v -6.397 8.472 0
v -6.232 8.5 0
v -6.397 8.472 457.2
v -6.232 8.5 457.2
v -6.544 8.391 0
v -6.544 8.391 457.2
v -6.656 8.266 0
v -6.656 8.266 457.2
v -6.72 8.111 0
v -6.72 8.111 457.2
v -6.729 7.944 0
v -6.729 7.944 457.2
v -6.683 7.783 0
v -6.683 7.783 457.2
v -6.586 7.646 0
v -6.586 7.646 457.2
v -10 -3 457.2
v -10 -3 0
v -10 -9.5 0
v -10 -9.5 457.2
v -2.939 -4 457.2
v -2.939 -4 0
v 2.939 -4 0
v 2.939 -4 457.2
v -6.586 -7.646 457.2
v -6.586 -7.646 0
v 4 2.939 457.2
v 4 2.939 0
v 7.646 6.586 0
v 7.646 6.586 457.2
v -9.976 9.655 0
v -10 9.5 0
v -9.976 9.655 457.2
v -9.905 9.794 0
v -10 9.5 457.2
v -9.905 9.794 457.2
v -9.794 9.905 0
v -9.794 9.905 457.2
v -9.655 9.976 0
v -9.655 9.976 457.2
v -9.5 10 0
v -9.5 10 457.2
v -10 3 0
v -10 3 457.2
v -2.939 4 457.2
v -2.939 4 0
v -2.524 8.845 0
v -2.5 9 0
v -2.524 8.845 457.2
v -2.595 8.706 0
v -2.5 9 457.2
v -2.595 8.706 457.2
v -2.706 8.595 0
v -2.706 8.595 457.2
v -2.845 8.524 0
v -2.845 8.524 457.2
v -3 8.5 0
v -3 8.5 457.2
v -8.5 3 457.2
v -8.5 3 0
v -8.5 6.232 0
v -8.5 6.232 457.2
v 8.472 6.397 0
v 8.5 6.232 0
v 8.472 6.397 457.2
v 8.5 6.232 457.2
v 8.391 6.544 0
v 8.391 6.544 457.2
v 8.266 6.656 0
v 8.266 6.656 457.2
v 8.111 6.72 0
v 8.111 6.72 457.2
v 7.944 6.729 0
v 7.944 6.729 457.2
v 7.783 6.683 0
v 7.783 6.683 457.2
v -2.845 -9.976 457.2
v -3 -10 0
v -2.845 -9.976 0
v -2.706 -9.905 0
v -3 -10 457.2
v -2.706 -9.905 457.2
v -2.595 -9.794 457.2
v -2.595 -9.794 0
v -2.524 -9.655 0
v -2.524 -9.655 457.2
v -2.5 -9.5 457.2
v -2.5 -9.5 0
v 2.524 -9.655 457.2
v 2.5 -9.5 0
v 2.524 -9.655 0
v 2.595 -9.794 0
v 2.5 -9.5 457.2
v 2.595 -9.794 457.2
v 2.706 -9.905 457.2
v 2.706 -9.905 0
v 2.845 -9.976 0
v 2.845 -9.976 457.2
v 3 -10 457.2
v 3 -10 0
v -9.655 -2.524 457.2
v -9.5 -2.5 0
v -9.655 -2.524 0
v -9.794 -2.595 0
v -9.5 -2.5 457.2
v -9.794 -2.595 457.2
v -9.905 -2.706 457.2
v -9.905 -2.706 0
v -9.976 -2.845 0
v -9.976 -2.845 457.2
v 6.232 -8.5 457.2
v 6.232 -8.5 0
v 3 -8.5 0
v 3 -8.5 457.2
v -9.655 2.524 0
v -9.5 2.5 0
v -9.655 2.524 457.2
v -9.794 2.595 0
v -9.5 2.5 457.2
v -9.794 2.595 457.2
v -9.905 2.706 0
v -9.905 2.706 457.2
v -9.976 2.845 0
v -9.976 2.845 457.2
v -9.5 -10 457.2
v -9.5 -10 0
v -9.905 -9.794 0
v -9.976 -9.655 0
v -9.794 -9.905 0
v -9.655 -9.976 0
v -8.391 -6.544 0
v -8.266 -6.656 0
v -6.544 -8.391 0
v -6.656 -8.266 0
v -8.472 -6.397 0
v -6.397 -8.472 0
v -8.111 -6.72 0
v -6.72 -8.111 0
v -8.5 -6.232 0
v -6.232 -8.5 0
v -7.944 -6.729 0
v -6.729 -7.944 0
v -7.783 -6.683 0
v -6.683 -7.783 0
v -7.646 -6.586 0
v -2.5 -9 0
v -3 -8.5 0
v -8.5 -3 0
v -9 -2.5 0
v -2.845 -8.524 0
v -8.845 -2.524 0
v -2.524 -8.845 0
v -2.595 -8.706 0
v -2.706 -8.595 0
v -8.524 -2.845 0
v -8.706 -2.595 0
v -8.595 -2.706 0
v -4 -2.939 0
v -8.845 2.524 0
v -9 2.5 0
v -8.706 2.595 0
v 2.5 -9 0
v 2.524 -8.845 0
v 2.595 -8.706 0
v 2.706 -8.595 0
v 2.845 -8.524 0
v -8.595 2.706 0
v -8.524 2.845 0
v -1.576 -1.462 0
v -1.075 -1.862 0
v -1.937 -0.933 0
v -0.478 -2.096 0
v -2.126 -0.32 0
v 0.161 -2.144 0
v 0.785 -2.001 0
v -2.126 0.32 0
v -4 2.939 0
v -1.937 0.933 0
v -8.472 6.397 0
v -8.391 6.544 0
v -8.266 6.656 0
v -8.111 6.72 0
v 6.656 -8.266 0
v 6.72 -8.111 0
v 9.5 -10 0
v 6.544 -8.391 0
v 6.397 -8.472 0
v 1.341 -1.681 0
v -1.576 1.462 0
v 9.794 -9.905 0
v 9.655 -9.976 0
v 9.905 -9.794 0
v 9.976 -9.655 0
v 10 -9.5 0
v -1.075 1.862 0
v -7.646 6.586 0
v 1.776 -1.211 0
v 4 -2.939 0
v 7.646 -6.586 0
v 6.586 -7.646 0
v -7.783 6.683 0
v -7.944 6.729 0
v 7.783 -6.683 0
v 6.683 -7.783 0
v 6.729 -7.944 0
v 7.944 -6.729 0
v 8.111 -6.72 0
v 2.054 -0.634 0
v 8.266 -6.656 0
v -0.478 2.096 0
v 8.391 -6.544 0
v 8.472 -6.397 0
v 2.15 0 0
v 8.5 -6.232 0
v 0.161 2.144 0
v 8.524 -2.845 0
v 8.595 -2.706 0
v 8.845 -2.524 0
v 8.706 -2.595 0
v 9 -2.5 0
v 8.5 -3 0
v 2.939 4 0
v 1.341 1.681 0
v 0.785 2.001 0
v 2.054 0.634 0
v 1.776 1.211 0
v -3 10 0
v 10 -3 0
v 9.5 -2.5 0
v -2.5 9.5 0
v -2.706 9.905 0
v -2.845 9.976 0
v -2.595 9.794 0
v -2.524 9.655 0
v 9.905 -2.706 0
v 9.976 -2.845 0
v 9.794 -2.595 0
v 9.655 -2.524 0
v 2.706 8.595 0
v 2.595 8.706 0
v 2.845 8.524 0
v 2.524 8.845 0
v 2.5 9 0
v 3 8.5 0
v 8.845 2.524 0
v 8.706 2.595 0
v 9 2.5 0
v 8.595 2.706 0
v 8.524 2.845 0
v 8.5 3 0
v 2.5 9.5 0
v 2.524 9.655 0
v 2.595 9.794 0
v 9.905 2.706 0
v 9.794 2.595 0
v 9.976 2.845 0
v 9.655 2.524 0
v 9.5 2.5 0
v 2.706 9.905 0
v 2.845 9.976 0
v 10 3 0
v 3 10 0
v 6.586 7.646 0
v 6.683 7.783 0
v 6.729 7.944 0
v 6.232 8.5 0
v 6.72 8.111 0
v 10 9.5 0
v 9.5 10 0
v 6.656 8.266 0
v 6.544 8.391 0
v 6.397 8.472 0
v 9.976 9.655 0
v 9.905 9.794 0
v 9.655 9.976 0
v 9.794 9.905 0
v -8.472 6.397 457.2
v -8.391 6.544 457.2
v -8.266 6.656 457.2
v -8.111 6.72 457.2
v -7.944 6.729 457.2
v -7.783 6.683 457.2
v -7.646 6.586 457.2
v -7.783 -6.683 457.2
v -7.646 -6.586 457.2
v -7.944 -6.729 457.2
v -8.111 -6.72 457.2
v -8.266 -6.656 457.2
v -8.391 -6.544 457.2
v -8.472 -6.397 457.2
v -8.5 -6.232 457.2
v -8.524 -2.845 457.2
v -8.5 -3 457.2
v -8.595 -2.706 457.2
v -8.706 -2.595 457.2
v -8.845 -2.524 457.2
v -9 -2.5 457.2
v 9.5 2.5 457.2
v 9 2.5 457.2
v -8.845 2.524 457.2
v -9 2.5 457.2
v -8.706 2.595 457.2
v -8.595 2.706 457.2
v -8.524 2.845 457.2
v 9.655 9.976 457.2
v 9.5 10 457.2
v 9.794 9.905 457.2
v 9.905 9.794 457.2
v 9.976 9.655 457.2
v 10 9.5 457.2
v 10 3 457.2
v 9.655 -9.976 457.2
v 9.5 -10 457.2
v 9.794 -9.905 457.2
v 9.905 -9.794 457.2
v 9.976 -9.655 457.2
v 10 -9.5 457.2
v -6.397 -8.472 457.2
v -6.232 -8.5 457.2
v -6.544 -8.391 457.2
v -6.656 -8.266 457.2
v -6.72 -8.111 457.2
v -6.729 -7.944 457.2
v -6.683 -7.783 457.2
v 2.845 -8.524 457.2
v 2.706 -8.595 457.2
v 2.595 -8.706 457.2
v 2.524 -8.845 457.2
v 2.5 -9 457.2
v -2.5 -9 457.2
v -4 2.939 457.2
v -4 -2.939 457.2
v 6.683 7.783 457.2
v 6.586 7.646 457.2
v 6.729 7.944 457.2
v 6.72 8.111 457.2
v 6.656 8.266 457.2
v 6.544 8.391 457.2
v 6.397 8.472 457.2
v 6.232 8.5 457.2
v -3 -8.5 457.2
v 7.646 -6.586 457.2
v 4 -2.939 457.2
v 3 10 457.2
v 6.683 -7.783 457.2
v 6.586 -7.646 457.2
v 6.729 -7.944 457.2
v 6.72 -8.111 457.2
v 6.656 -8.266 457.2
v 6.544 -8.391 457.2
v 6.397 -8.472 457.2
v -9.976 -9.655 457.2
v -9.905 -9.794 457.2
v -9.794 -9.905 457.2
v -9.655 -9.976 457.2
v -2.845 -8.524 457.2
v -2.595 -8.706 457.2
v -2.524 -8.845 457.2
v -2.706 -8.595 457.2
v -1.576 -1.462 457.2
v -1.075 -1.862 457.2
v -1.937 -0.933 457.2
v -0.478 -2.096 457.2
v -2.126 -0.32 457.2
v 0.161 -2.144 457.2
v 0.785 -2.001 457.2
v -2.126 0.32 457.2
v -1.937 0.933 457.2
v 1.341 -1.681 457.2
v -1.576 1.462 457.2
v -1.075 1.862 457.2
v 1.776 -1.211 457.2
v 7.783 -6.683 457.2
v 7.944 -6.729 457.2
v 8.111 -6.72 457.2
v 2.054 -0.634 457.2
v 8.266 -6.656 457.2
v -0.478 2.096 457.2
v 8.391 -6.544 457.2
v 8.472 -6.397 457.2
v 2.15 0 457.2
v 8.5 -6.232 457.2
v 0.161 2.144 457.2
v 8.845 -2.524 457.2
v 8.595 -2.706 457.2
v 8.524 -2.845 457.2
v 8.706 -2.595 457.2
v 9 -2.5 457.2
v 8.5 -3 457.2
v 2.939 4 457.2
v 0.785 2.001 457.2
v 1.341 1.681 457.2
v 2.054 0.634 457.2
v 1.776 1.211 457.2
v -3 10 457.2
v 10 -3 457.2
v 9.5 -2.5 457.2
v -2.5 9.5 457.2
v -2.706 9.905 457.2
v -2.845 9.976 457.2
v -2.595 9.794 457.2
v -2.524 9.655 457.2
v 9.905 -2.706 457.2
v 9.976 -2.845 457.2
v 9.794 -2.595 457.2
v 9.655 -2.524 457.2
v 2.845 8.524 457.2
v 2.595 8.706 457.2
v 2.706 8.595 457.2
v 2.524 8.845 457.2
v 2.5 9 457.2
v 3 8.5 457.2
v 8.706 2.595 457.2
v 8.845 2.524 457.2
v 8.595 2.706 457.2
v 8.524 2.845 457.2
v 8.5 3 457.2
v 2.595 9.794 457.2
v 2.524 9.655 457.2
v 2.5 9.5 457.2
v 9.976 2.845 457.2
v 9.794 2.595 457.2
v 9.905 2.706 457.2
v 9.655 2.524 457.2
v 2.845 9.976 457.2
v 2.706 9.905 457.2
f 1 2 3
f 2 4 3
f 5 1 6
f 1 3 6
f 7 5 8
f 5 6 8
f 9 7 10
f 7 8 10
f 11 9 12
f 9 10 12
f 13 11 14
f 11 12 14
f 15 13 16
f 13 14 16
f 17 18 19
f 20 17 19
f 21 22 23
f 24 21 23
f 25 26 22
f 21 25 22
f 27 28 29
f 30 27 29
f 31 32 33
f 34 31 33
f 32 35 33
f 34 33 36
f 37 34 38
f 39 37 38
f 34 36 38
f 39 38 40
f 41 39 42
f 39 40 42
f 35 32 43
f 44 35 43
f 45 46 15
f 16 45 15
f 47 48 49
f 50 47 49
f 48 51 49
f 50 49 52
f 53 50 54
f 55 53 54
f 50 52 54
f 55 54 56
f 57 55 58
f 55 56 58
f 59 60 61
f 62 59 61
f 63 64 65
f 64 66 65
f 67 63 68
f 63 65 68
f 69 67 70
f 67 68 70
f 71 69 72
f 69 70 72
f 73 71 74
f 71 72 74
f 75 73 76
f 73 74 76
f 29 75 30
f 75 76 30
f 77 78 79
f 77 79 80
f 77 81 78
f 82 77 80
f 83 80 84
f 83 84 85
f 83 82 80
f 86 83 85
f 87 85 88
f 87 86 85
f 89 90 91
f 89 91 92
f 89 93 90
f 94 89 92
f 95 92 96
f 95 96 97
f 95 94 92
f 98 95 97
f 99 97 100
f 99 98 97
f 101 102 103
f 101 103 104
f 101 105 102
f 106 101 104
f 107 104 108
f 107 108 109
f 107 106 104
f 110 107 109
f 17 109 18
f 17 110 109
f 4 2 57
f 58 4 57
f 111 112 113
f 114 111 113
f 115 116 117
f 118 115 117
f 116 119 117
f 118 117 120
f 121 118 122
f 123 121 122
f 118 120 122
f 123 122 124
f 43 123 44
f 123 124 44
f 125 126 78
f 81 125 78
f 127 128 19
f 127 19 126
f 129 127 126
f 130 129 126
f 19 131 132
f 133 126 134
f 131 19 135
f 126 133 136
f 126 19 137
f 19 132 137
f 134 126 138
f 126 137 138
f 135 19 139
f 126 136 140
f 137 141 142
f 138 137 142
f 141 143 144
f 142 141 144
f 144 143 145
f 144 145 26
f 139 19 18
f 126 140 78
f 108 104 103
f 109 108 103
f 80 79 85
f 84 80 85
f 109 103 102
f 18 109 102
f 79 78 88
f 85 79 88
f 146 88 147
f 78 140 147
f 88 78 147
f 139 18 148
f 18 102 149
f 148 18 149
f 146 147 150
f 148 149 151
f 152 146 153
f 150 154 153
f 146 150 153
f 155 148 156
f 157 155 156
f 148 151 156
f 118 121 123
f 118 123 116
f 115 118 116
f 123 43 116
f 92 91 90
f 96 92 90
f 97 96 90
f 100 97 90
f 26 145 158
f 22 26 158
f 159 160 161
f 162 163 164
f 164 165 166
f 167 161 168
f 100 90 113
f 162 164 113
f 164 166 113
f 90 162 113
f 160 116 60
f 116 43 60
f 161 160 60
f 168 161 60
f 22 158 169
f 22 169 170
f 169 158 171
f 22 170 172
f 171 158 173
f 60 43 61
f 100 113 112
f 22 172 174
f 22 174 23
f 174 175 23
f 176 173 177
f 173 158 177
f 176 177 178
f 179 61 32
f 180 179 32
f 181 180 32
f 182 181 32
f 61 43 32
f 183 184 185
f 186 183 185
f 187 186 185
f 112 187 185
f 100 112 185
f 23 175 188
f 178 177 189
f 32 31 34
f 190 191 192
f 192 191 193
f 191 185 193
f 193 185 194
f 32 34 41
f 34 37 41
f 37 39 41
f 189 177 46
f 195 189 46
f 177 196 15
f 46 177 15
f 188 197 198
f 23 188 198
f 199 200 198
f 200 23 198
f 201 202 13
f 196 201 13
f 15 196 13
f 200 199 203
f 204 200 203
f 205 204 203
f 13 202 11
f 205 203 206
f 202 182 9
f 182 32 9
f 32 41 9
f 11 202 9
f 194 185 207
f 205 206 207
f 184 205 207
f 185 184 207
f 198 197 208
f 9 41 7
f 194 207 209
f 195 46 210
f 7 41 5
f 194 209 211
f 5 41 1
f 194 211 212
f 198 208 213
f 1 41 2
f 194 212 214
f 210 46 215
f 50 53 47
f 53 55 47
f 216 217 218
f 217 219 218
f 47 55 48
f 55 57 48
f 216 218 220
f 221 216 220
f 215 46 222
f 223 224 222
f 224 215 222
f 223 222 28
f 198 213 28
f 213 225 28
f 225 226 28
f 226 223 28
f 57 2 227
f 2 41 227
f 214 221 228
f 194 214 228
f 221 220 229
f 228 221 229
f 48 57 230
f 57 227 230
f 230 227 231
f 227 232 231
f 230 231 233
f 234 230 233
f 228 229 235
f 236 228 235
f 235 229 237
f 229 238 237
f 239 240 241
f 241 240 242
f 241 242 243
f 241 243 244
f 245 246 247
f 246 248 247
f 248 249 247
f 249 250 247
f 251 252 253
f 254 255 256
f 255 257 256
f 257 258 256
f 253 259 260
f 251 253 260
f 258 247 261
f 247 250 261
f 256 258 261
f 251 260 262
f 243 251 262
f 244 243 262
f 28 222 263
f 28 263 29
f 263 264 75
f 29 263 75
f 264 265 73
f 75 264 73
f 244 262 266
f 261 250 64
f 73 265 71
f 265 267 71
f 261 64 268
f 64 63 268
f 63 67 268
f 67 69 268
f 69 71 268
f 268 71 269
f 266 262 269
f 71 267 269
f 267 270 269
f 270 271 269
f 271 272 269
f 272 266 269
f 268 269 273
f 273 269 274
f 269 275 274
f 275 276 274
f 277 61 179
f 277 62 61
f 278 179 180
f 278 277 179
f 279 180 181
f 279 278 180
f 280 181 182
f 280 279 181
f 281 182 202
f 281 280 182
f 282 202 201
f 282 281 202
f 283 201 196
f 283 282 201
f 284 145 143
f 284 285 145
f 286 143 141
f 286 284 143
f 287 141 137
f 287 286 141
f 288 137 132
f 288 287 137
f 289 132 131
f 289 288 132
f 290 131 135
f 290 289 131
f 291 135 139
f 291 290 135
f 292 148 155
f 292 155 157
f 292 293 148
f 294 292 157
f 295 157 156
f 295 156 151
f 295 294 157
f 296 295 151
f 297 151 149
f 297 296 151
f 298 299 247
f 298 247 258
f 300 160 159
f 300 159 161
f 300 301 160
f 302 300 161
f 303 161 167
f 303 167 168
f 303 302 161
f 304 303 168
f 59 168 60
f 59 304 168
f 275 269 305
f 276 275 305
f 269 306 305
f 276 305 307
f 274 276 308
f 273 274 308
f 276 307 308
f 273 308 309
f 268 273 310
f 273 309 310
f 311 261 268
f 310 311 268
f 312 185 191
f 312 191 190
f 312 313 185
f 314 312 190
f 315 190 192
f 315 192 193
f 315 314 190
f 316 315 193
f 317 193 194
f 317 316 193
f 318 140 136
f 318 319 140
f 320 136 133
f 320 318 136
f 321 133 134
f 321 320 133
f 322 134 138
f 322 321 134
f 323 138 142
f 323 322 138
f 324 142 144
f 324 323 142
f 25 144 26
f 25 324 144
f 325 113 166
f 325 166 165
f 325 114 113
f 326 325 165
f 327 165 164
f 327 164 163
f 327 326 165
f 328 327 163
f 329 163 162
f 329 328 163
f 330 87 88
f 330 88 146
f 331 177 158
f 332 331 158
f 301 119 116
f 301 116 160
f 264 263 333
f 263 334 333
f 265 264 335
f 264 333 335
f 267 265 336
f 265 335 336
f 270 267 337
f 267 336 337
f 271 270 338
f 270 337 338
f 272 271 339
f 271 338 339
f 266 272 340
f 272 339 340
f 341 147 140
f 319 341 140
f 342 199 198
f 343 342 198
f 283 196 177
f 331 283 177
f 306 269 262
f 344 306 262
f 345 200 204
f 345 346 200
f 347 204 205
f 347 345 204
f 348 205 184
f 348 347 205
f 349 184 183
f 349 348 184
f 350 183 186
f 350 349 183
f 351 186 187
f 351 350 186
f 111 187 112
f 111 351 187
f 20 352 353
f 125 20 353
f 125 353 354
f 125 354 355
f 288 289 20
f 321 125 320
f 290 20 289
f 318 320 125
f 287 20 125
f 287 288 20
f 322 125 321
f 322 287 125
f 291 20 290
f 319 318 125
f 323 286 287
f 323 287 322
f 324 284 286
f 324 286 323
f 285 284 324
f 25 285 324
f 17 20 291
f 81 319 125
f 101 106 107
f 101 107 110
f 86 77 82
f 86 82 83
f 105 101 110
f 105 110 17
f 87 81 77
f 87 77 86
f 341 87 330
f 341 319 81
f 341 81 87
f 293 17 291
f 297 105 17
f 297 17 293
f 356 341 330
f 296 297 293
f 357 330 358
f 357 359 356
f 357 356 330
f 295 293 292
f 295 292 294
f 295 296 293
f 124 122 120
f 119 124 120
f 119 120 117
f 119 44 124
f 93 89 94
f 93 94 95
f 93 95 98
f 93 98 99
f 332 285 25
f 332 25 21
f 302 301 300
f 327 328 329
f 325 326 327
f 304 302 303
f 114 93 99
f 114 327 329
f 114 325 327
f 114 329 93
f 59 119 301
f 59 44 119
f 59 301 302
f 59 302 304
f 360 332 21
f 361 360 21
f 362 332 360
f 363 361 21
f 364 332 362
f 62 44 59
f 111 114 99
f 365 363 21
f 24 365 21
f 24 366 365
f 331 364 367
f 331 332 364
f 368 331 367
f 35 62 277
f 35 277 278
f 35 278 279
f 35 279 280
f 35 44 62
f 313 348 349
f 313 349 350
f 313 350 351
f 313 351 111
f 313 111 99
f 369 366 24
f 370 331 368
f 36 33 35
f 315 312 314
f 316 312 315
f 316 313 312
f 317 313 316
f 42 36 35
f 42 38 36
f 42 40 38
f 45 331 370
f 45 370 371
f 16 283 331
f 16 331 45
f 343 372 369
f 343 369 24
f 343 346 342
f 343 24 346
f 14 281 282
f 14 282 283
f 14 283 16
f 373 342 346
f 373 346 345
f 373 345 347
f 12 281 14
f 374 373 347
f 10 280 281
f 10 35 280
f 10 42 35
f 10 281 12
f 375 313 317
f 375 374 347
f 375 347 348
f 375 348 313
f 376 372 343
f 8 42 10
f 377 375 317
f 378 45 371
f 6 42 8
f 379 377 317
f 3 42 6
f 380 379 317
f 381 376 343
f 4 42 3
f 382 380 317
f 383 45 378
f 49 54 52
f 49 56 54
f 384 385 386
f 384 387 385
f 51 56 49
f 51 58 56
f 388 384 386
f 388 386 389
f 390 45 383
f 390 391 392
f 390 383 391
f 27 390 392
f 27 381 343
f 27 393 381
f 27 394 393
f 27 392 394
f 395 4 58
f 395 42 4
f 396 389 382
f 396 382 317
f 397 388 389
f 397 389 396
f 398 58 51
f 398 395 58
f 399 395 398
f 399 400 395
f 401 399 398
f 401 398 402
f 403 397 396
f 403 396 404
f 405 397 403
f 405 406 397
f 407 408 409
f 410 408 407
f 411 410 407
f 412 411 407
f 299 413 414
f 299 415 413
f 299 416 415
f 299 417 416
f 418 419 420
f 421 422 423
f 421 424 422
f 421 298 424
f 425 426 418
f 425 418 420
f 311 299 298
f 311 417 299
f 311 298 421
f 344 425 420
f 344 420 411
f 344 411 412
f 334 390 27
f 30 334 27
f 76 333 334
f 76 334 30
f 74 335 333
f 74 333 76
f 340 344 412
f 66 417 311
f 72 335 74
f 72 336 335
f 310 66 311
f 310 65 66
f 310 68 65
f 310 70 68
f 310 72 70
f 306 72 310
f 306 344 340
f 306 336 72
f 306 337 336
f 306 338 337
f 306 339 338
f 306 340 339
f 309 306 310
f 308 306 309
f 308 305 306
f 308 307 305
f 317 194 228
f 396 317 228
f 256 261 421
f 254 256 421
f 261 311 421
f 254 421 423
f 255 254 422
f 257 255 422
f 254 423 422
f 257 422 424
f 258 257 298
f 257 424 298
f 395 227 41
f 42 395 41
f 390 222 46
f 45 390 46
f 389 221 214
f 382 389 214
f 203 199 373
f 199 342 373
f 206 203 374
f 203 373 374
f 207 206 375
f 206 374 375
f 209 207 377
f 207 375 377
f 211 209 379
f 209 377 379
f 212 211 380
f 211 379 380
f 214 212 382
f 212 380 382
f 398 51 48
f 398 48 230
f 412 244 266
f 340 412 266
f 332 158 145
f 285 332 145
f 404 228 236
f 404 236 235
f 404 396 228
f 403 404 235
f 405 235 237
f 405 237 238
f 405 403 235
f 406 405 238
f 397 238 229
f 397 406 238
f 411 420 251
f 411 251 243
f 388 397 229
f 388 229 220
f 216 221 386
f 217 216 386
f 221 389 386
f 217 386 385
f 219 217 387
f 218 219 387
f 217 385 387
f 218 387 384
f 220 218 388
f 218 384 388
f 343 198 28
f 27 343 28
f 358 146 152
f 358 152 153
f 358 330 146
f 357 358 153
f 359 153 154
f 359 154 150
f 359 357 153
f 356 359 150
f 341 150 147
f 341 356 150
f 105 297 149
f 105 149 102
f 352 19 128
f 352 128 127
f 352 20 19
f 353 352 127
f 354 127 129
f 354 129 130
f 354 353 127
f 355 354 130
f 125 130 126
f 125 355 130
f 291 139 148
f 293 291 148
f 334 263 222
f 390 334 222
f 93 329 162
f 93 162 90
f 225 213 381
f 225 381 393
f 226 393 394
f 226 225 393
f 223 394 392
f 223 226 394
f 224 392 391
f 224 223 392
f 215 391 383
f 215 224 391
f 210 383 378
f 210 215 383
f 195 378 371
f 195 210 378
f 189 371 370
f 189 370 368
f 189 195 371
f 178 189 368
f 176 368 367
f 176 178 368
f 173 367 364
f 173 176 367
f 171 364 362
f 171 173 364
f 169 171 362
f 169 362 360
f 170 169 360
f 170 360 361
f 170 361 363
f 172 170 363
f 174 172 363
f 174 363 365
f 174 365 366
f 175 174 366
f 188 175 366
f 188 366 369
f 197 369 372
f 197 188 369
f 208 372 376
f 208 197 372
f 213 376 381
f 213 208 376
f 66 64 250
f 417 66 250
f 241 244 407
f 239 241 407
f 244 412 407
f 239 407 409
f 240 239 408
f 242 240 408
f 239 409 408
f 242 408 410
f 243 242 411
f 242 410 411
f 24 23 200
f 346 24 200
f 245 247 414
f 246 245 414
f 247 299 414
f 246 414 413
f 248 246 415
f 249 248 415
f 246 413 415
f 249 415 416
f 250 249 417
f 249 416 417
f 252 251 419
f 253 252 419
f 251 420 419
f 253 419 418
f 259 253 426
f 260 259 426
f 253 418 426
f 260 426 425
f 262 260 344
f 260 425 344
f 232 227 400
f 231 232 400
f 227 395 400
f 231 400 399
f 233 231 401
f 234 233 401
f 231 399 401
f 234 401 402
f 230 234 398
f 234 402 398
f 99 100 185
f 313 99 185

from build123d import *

# Parameters (mm, degrees)
SKETCH1_R           = 2.15
BOSS_EXTRUDE1_DEPTH = 457.2
FILLET1_R           = 0.5


with BuildPart() as part:
    # Sketch1 → Boss-Extrude1 (new body)
    with BuildSketch(Plane.XY):
        Polygon((-10, 2.5), (-8.5, 2.5), (-8.5, 7.439339828), (-4, 2.939339828), (-4, 0), (-4, -2.939339828), (-8.5, -7.439339828), (-8.5, -2.5), (-10, -2.5), (-10, -10), (-2.5, -10), (-2.5, -8.5), (-7.439339828, -8.5), (-2.939339828, -4), (0, -4), (2.939339828, -4), (7.439339828, -8.5), (2.5, -8.5), (2.5, -10), (10, -10), (10, -2.5), (8.5, -2.5), (8.5, -7.439339828), (4, -2.939339828), (4, 0), (4, 2.939339828), (8.5, 7.439339828), (8.5, 2.5), (10, 2.5), (10, 10), (2.5, 10), (2.5, 8.5), (7.439339828, 8.5), (2.939339828, 4), (0, 4), (-2.939339828, 4), (-7.439339828, 8.5), (-2.5, 8.5), (-2.5, 10), (-10, 10), align=None)
        Circle(SKETCH1_R, mode=Mode.SUBTRACT)
    extrude(amount=BOSS_EXTRUDE1_DEPTH)

    # Fillet1
    fillet1_edges = [part.edges().sort_by_distance(p)[0] for p in [
        (7.439339828, 8.5, 228.6),
        (2.5, 8.5, 228.6),
        (2.5, 10, 228.6),
        (10, 10, 228.6),
        (10, 2.5, 228.6),
        (8.5, 2.5, 228.6),
        (8.5, 7.439339828, 228.6),
        (8.5, -7.439339828, 228.6),
        (8.5, -2.5, 228.6),
        (10, -2.5, 228.6),
        (10, -10, 228.6),
        (2.5, -10, 228.6),
        (2.5, -8.5, 228.6),
        (7.439339828, -8.5, 228.6),
        (-7.439339828, -8.5, 228.6),
        (-2.5, -8.5, 228.6),
        (-2.5, -10, 228.6),
        (-10, -10, 228.6),
        (-10, -2.5, 228.6),
        (-8.5, -2.5, 228.6),
        (-8.5, -7.439339828, 228.6),
        (-8.5, 7.439339828, 228.6),
        (-8.5, 2.5, 228.6),
        (-10, 2.5, 228.6),
        (-10, 10, 228.6),
        (-2.5, 10, 228.6),
        (-2.5, 8.5, 228.6),
        (-7.439339828, 8.5, 228.6),
    ]]
    fillet(fillet1_edges, radius=FILLET1_R)


solid = part.part
